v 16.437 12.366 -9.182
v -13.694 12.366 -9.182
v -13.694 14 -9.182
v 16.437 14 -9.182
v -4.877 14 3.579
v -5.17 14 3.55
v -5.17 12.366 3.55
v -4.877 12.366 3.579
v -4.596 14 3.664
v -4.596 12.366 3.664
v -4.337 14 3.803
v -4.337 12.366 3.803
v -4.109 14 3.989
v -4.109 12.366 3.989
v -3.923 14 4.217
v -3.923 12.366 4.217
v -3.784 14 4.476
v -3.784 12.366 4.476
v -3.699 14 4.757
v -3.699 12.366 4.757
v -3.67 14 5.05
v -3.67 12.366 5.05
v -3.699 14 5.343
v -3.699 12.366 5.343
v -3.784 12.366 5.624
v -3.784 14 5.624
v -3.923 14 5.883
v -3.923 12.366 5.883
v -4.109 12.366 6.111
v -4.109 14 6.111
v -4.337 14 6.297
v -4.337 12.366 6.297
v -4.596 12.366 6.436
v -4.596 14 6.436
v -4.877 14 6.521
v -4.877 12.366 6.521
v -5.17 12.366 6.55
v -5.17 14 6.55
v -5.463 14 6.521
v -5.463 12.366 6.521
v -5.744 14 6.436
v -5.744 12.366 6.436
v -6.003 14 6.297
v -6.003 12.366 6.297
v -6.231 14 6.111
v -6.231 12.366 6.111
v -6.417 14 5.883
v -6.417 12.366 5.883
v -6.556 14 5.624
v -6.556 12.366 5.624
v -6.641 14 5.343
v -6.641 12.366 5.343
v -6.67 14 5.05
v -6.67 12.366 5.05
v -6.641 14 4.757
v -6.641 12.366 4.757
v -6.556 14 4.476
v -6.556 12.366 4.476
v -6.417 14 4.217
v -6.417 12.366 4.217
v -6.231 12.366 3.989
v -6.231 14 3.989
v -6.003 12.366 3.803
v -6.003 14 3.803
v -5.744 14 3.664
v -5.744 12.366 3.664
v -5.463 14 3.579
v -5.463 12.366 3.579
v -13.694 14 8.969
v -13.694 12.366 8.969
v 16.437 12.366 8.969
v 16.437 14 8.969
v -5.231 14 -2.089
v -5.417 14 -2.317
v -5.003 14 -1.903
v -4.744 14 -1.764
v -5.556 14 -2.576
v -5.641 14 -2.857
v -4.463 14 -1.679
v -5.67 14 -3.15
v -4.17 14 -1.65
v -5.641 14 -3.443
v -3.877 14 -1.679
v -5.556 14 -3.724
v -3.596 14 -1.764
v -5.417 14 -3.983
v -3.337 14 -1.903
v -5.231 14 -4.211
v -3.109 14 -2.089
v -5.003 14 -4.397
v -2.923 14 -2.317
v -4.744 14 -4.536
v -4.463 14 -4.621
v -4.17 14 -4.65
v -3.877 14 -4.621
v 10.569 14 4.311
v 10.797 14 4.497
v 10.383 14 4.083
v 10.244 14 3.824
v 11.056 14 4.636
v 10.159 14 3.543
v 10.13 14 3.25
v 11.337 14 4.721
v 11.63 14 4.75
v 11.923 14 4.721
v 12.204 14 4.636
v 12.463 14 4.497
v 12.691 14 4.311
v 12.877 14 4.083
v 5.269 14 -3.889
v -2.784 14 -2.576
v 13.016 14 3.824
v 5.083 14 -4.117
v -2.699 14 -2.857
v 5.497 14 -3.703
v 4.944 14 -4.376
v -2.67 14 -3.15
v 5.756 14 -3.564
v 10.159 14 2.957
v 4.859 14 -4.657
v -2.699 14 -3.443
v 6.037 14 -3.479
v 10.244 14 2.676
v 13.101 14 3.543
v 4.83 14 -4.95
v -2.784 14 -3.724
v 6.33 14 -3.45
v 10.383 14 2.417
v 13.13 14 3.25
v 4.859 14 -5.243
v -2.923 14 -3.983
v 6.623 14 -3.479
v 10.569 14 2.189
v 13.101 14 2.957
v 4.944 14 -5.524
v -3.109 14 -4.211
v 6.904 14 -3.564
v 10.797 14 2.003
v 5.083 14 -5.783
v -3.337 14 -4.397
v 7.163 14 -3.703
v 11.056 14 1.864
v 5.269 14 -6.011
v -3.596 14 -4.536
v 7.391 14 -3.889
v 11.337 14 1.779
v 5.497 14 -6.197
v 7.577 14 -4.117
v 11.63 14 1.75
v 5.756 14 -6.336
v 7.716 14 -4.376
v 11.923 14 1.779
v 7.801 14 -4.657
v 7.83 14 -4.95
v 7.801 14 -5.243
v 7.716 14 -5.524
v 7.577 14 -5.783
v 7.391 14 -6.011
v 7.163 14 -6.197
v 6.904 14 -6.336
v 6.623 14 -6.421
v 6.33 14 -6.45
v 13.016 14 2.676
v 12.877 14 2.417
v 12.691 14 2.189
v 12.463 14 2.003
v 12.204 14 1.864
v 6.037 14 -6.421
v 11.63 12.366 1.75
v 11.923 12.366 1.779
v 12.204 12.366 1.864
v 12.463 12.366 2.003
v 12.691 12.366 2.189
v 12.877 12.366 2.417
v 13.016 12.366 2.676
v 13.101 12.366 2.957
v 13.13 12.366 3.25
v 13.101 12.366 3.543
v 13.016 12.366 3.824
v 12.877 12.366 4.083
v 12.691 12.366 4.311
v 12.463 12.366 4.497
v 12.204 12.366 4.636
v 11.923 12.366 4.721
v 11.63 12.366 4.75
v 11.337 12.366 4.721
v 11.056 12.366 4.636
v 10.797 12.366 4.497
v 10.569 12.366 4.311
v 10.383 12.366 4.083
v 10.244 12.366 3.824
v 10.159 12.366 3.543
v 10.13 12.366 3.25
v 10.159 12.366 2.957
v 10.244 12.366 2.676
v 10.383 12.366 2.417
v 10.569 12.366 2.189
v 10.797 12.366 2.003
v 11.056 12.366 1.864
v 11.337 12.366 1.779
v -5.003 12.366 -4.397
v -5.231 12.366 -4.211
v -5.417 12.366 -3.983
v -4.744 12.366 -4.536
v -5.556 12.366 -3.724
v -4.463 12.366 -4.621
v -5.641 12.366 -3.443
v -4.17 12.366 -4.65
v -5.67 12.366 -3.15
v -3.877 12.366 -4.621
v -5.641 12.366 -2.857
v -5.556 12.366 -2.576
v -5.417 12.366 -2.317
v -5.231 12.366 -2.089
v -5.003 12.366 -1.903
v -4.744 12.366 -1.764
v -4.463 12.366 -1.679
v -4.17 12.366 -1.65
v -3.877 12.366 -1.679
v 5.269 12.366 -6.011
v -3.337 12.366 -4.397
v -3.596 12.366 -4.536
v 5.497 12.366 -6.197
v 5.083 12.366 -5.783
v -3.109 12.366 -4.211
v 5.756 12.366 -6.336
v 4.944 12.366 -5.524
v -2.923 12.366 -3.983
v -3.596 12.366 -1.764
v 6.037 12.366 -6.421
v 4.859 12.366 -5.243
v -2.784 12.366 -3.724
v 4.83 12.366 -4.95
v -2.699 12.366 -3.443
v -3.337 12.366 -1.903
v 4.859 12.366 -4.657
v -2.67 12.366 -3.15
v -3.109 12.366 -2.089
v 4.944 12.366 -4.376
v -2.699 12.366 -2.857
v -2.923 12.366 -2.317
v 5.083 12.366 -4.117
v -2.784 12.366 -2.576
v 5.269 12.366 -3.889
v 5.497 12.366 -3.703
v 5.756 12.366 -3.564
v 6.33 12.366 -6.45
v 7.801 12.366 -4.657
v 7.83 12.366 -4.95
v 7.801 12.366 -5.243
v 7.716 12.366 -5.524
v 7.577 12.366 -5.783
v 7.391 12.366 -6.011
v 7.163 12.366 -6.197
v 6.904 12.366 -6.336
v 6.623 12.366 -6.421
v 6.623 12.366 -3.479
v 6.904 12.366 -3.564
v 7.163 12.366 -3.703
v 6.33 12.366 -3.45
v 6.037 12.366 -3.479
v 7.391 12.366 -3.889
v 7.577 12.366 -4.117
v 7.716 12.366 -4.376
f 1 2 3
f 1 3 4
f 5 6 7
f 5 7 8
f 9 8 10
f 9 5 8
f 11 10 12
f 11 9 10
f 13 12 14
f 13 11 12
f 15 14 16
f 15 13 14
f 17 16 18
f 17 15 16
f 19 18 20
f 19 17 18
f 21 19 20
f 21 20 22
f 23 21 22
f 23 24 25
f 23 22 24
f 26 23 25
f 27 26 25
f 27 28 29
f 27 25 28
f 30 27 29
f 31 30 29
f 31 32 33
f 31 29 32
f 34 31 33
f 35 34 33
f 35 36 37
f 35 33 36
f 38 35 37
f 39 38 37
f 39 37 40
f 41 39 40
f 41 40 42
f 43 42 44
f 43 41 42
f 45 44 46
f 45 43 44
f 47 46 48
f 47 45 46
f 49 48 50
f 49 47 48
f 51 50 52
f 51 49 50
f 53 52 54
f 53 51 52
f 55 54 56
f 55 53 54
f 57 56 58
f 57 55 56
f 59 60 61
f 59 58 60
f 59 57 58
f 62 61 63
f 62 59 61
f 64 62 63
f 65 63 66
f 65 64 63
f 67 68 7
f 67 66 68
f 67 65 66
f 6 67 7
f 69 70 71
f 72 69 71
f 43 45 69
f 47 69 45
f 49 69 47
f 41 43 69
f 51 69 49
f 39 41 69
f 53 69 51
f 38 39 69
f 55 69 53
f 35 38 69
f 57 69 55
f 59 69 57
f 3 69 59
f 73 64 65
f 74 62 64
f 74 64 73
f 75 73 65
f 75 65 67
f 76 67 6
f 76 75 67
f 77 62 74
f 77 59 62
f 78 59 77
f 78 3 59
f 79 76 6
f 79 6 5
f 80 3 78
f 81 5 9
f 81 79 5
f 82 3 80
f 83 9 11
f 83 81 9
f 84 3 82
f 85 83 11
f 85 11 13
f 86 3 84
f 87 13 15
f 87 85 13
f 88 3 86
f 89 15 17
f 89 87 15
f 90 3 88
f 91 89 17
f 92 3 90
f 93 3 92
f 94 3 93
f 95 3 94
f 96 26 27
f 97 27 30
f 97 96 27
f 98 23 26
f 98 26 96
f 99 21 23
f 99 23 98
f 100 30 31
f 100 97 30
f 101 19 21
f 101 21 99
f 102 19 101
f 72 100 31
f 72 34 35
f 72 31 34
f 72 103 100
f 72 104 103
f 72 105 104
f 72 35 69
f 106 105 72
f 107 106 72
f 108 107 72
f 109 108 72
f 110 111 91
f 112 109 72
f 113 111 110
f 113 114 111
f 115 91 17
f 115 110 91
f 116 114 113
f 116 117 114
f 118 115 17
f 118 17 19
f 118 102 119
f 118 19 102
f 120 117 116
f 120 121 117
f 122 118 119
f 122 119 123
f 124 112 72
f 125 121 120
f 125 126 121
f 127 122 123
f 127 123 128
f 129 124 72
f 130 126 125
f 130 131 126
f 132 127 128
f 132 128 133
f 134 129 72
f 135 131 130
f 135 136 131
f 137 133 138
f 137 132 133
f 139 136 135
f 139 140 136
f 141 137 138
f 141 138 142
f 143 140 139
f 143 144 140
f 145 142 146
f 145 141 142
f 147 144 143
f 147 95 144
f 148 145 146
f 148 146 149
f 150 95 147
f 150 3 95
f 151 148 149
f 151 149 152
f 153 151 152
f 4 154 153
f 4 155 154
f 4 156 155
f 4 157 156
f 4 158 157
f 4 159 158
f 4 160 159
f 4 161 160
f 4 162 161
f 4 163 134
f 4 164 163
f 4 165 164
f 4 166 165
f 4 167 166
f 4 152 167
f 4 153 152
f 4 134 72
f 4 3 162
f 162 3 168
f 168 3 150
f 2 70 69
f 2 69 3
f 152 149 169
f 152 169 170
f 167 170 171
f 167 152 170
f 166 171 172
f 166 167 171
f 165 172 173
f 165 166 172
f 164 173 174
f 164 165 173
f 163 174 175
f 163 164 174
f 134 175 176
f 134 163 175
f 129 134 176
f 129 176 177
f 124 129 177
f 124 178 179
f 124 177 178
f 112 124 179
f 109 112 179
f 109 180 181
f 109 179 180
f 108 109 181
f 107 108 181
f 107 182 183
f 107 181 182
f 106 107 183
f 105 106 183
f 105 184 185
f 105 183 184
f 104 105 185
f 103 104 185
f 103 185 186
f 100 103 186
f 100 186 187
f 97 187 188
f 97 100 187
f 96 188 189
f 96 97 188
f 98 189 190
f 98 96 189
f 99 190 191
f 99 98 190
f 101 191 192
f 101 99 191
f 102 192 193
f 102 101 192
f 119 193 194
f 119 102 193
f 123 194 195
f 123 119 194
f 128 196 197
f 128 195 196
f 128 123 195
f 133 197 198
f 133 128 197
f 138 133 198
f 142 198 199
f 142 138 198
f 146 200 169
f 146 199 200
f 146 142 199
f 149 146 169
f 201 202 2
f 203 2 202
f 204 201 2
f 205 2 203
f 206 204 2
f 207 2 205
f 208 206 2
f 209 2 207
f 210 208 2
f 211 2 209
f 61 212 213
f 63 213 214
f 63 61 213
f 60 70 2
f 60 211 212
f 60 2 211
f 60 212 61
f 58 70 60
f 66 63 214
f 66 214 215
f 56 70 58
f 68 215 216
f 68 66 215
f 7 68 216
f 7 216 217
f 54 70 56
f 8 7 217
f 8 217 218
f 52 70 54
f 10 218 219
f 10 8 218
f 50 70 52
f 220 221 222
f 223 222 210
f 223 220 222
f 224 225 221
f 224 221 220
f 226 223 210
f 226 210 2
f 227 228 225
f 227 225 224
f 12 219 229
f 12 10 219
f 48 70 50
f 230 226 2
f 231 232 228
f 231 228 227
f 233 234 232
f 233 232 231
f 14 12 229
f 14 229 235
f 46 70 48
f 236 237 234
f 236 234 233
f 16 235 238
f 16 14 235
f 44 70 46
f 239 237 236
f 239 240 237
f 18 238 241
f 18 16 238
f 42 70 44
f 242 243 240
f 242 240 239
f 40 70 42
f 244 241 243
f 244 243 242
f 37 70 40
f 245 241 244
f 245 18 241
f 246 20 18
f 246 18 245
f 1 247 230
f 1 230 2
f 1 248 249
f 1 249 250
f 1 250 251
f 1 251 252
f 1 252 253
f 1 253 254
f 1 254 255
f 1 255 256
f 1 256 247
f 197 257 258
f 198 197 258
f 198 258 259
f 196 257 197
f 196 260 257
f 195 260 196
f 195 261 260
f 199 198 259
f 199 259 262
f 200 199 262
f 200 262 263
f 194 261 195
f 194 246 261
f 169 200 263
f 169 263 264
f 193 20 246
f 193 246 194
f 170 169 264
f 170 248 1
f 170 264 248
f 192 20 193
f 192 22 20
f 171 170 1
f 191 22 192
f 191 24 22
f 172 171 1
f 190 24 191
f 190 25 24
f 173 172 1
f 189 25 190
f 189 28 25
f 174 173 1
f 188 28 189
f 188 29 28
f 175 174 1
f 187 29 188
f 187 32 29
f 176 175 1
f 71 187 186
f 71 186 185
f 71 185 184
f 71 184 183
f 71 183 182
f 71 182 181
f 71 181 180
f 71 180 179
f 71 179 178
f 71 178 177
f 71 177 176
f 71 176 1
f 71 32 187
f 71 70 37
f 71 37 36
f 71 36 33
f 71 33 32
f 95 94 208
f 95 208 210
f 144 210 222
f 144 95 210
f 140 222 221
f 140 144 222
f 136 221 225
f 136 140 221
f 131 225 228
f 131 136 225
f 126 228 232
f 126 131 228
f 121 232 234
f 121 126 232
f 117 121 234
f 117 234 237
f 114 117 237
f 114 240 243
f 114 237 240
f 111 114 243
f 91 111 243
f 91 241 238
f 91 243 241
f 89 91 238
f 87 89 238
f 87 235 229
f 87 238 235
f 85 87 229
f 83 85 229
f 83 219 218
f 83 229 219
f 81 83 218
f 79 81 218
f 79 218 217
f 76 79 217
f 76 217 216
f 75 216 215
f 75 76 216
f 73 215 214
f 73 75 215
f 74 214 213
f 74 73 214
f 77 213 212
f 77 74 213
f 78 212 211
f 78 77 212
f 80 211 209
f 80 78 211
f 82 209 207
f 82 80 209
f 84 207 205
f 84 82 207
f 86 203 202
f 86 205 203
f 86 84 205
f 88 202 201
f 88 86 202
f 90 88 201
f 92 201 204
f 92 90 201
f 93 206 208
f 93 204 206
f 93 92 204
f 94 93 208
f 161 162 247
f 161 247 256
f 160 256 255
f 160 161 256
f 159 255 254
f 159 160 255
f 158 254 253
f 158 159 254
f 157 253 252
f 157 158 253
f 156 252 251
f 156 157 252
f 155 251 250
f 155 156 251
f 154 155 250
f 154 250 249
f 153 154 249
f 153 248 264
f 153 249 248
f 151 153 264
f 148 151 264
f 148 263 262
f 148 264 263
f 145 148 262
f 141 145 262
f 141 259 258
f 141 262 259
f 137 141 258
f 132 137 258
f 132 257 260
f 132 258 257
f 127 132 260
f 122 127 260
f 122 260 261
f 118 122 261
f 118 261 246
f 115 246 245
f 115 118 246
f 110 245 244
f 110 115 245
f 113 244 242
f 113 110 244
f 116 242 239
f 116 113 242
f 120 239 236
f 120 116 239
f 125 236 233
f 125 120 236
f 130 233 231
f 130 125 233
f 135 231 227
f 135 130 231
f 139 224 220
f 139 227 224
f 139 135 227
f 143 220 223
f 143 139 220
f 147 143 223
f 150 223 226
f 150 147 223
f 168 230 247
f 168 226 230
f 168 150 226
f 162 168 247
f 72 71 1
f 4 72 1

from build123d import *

# Parameters (mm, degrees)
SKETCH1_W               = 35
SKETCH1_H               = 55
SKETCH1_R               = 1.5
SKETCH1_W_2             = 1.053264104
SKETCH1_H_2             = 1.810086697
BOSS_EXTRUDE1_DEPTH     = 3
SKETCH2_W               = 30.130506089
SKETCH2_H               = 18.151203477
BOSS_EXTRUDE2_DEPTH     = 11
SKETCH4_W               = 25.972666726
SKETCH4_H               = 17.735623468
CUT_EXTRUDE2_DEPTH      = 4
CUT_EXTRUDE3_DEPTH      = 36.47534355
CUT_EXTRUDE3_DEPTH_BACK = 36.47534355
SKETCH6_R               = 1.5
CUT_EXTRUDE4_DEPTH      = 35.095454242
CUT_EXTRUDE4_DEPTH_BACK = 2.5
SKETCH7_R               = 3
SKETCH8_W               = 48.556860944
SKETCH8_H               = 13.798997775
CUT_EXTRUDE5_DEPTH      = 60.390655831


with BuildPart() as part:
    # Sketch1 → Boss-Extrude1 (new body)
    with BuildSketch(Plane(origin=(0, 0, 0), x_dir=(1, 0, 0), z_dir=(0, 1, 0))):
        Rectangle(SKETCH1_W, SKETCH1_H)
        with Locations(Location((12.5, 25, 0), (0, 0, 270))):
            Circle(SKETCH1_R, mode=Mode.SUBTRACT)
        with Locations(Location((-12.5, 25, 0), (0, 0, 270))):
            Circle(SKETCH1_R, mode=Mode.SUBTRACT)
        with Locations(Location((12.5, -25, 0), (0, 0, 270))):
            Circle(SKETCH1_R, mode=Mode.SUBTRACT)
        with Locations(Location((-12.5, -25, 0), (0, 0, 270))):
            Circle(SKETCH1_R, mode=Mode.SUBTRACT)
        with Locations((14.770586435, -21.896230663)):
            Rectangle(SKETCH1_W_2, SKETCH1_H_2, mode=Mode.SUBTRACT)
    extrude(amount=BOSS_EXTRUDE1_DEPTH)

    # Sketch2 → Boss-Extrude2 (add)
    with BuildSketch(Plane(origin=(0, 3, 0), x_dir=(1, 0, 0), z_dir=(0, 1, 0))):
        with Locations((1.371677436, 0.106547158)):
            Rectangle(SKETCH2_W, SKETCH2_H)
    extrude(amount=BOSS_EXTRUDE2_DEPTH)

    # Sketch4 → Cut-Extrude2 (cut)
    with BuildSketch(Plane.XZ):
        with Locations((1.214862274, -0.038232514)):
            Rectangle(SKETCH4_W, SKETCH4_H)
    extrude(amount=-CUT_EXTRUDE2_DEPTH, mode=Mode.SUBTRACT)

    # Sketch6 → Cut-Extrude3 (cut, two sides: drawn at the far end of the back side and taken through both)
    with BuildSketch(Plane.XZ.offset(-CUT_EXTRUDE3_DEPTH_BACK)):
        with Locations(Location((11.63, 3.25, 0), (0, 0, 270))):
            Circle(SKETCH6_R)
        with Locations(Location((-5.17, 5.05, 0), (0, 0, 270))):
            Circle(SKETCH6_R)
        with Locations(Location((-4.17, -3.15, 0), (0, 0, 270))):
            Circle(SKETCH6_R)
        with Locations(Location((6.33, -4.95, 0), (0, 0, 270))):
            Circle(SKETCH6_R)
    extrude(amount=CUT_EXTRUDE3_DEPTH + CUT_EXTRUDE3_DEPTH_BACK, mode=Mode.SUBTRACT)

    # Sketch7 → Cut-Extrude4 (cut, two sides: drawn at the far end of the back side and taken through both)
    with BuildSketch(Plane.XZ.offset(-4).offset(-CUT_EXTRUDE4_DEPTH_BACK)):
        with Locations(Location((-5.17, 5.05, 0), (0, 0, 90))):
            Circle(SKETCH7_R)
        with Locations(Location((-4.17, -3.15, 0), (0, 0, 90))):
            Circle(SKETCH7_R)
        with Locations(Location((6.33, -4.95, 0), (0, 0, 90))):
            Circle(SKETCH7_R)
        with Locations(Location((11.63, 3.25, 0), (0, 0, 31.011355011))):
            Circle(SKETCH7_R)
    extrude(amount=CUT_EXTRUDE4_DEPTH + CUT_EXTRUDE4_DEPTH_BACK, mode=Mode.SUBTRACT)

    # Sketch8 → Cut-Extrude5 (cut, through all)
    with BuildSketch(Plane.XY.offset(27.5)):
        with Locations((-0.01102719, 5.466634706)):
            Rectangle(SKETCH8_W, SKETCH8_H)
    extrude(amount=-CUT_EXTRUDE5_DEPTH, mode=Mode.SUBTRACT)


solid = part.part
